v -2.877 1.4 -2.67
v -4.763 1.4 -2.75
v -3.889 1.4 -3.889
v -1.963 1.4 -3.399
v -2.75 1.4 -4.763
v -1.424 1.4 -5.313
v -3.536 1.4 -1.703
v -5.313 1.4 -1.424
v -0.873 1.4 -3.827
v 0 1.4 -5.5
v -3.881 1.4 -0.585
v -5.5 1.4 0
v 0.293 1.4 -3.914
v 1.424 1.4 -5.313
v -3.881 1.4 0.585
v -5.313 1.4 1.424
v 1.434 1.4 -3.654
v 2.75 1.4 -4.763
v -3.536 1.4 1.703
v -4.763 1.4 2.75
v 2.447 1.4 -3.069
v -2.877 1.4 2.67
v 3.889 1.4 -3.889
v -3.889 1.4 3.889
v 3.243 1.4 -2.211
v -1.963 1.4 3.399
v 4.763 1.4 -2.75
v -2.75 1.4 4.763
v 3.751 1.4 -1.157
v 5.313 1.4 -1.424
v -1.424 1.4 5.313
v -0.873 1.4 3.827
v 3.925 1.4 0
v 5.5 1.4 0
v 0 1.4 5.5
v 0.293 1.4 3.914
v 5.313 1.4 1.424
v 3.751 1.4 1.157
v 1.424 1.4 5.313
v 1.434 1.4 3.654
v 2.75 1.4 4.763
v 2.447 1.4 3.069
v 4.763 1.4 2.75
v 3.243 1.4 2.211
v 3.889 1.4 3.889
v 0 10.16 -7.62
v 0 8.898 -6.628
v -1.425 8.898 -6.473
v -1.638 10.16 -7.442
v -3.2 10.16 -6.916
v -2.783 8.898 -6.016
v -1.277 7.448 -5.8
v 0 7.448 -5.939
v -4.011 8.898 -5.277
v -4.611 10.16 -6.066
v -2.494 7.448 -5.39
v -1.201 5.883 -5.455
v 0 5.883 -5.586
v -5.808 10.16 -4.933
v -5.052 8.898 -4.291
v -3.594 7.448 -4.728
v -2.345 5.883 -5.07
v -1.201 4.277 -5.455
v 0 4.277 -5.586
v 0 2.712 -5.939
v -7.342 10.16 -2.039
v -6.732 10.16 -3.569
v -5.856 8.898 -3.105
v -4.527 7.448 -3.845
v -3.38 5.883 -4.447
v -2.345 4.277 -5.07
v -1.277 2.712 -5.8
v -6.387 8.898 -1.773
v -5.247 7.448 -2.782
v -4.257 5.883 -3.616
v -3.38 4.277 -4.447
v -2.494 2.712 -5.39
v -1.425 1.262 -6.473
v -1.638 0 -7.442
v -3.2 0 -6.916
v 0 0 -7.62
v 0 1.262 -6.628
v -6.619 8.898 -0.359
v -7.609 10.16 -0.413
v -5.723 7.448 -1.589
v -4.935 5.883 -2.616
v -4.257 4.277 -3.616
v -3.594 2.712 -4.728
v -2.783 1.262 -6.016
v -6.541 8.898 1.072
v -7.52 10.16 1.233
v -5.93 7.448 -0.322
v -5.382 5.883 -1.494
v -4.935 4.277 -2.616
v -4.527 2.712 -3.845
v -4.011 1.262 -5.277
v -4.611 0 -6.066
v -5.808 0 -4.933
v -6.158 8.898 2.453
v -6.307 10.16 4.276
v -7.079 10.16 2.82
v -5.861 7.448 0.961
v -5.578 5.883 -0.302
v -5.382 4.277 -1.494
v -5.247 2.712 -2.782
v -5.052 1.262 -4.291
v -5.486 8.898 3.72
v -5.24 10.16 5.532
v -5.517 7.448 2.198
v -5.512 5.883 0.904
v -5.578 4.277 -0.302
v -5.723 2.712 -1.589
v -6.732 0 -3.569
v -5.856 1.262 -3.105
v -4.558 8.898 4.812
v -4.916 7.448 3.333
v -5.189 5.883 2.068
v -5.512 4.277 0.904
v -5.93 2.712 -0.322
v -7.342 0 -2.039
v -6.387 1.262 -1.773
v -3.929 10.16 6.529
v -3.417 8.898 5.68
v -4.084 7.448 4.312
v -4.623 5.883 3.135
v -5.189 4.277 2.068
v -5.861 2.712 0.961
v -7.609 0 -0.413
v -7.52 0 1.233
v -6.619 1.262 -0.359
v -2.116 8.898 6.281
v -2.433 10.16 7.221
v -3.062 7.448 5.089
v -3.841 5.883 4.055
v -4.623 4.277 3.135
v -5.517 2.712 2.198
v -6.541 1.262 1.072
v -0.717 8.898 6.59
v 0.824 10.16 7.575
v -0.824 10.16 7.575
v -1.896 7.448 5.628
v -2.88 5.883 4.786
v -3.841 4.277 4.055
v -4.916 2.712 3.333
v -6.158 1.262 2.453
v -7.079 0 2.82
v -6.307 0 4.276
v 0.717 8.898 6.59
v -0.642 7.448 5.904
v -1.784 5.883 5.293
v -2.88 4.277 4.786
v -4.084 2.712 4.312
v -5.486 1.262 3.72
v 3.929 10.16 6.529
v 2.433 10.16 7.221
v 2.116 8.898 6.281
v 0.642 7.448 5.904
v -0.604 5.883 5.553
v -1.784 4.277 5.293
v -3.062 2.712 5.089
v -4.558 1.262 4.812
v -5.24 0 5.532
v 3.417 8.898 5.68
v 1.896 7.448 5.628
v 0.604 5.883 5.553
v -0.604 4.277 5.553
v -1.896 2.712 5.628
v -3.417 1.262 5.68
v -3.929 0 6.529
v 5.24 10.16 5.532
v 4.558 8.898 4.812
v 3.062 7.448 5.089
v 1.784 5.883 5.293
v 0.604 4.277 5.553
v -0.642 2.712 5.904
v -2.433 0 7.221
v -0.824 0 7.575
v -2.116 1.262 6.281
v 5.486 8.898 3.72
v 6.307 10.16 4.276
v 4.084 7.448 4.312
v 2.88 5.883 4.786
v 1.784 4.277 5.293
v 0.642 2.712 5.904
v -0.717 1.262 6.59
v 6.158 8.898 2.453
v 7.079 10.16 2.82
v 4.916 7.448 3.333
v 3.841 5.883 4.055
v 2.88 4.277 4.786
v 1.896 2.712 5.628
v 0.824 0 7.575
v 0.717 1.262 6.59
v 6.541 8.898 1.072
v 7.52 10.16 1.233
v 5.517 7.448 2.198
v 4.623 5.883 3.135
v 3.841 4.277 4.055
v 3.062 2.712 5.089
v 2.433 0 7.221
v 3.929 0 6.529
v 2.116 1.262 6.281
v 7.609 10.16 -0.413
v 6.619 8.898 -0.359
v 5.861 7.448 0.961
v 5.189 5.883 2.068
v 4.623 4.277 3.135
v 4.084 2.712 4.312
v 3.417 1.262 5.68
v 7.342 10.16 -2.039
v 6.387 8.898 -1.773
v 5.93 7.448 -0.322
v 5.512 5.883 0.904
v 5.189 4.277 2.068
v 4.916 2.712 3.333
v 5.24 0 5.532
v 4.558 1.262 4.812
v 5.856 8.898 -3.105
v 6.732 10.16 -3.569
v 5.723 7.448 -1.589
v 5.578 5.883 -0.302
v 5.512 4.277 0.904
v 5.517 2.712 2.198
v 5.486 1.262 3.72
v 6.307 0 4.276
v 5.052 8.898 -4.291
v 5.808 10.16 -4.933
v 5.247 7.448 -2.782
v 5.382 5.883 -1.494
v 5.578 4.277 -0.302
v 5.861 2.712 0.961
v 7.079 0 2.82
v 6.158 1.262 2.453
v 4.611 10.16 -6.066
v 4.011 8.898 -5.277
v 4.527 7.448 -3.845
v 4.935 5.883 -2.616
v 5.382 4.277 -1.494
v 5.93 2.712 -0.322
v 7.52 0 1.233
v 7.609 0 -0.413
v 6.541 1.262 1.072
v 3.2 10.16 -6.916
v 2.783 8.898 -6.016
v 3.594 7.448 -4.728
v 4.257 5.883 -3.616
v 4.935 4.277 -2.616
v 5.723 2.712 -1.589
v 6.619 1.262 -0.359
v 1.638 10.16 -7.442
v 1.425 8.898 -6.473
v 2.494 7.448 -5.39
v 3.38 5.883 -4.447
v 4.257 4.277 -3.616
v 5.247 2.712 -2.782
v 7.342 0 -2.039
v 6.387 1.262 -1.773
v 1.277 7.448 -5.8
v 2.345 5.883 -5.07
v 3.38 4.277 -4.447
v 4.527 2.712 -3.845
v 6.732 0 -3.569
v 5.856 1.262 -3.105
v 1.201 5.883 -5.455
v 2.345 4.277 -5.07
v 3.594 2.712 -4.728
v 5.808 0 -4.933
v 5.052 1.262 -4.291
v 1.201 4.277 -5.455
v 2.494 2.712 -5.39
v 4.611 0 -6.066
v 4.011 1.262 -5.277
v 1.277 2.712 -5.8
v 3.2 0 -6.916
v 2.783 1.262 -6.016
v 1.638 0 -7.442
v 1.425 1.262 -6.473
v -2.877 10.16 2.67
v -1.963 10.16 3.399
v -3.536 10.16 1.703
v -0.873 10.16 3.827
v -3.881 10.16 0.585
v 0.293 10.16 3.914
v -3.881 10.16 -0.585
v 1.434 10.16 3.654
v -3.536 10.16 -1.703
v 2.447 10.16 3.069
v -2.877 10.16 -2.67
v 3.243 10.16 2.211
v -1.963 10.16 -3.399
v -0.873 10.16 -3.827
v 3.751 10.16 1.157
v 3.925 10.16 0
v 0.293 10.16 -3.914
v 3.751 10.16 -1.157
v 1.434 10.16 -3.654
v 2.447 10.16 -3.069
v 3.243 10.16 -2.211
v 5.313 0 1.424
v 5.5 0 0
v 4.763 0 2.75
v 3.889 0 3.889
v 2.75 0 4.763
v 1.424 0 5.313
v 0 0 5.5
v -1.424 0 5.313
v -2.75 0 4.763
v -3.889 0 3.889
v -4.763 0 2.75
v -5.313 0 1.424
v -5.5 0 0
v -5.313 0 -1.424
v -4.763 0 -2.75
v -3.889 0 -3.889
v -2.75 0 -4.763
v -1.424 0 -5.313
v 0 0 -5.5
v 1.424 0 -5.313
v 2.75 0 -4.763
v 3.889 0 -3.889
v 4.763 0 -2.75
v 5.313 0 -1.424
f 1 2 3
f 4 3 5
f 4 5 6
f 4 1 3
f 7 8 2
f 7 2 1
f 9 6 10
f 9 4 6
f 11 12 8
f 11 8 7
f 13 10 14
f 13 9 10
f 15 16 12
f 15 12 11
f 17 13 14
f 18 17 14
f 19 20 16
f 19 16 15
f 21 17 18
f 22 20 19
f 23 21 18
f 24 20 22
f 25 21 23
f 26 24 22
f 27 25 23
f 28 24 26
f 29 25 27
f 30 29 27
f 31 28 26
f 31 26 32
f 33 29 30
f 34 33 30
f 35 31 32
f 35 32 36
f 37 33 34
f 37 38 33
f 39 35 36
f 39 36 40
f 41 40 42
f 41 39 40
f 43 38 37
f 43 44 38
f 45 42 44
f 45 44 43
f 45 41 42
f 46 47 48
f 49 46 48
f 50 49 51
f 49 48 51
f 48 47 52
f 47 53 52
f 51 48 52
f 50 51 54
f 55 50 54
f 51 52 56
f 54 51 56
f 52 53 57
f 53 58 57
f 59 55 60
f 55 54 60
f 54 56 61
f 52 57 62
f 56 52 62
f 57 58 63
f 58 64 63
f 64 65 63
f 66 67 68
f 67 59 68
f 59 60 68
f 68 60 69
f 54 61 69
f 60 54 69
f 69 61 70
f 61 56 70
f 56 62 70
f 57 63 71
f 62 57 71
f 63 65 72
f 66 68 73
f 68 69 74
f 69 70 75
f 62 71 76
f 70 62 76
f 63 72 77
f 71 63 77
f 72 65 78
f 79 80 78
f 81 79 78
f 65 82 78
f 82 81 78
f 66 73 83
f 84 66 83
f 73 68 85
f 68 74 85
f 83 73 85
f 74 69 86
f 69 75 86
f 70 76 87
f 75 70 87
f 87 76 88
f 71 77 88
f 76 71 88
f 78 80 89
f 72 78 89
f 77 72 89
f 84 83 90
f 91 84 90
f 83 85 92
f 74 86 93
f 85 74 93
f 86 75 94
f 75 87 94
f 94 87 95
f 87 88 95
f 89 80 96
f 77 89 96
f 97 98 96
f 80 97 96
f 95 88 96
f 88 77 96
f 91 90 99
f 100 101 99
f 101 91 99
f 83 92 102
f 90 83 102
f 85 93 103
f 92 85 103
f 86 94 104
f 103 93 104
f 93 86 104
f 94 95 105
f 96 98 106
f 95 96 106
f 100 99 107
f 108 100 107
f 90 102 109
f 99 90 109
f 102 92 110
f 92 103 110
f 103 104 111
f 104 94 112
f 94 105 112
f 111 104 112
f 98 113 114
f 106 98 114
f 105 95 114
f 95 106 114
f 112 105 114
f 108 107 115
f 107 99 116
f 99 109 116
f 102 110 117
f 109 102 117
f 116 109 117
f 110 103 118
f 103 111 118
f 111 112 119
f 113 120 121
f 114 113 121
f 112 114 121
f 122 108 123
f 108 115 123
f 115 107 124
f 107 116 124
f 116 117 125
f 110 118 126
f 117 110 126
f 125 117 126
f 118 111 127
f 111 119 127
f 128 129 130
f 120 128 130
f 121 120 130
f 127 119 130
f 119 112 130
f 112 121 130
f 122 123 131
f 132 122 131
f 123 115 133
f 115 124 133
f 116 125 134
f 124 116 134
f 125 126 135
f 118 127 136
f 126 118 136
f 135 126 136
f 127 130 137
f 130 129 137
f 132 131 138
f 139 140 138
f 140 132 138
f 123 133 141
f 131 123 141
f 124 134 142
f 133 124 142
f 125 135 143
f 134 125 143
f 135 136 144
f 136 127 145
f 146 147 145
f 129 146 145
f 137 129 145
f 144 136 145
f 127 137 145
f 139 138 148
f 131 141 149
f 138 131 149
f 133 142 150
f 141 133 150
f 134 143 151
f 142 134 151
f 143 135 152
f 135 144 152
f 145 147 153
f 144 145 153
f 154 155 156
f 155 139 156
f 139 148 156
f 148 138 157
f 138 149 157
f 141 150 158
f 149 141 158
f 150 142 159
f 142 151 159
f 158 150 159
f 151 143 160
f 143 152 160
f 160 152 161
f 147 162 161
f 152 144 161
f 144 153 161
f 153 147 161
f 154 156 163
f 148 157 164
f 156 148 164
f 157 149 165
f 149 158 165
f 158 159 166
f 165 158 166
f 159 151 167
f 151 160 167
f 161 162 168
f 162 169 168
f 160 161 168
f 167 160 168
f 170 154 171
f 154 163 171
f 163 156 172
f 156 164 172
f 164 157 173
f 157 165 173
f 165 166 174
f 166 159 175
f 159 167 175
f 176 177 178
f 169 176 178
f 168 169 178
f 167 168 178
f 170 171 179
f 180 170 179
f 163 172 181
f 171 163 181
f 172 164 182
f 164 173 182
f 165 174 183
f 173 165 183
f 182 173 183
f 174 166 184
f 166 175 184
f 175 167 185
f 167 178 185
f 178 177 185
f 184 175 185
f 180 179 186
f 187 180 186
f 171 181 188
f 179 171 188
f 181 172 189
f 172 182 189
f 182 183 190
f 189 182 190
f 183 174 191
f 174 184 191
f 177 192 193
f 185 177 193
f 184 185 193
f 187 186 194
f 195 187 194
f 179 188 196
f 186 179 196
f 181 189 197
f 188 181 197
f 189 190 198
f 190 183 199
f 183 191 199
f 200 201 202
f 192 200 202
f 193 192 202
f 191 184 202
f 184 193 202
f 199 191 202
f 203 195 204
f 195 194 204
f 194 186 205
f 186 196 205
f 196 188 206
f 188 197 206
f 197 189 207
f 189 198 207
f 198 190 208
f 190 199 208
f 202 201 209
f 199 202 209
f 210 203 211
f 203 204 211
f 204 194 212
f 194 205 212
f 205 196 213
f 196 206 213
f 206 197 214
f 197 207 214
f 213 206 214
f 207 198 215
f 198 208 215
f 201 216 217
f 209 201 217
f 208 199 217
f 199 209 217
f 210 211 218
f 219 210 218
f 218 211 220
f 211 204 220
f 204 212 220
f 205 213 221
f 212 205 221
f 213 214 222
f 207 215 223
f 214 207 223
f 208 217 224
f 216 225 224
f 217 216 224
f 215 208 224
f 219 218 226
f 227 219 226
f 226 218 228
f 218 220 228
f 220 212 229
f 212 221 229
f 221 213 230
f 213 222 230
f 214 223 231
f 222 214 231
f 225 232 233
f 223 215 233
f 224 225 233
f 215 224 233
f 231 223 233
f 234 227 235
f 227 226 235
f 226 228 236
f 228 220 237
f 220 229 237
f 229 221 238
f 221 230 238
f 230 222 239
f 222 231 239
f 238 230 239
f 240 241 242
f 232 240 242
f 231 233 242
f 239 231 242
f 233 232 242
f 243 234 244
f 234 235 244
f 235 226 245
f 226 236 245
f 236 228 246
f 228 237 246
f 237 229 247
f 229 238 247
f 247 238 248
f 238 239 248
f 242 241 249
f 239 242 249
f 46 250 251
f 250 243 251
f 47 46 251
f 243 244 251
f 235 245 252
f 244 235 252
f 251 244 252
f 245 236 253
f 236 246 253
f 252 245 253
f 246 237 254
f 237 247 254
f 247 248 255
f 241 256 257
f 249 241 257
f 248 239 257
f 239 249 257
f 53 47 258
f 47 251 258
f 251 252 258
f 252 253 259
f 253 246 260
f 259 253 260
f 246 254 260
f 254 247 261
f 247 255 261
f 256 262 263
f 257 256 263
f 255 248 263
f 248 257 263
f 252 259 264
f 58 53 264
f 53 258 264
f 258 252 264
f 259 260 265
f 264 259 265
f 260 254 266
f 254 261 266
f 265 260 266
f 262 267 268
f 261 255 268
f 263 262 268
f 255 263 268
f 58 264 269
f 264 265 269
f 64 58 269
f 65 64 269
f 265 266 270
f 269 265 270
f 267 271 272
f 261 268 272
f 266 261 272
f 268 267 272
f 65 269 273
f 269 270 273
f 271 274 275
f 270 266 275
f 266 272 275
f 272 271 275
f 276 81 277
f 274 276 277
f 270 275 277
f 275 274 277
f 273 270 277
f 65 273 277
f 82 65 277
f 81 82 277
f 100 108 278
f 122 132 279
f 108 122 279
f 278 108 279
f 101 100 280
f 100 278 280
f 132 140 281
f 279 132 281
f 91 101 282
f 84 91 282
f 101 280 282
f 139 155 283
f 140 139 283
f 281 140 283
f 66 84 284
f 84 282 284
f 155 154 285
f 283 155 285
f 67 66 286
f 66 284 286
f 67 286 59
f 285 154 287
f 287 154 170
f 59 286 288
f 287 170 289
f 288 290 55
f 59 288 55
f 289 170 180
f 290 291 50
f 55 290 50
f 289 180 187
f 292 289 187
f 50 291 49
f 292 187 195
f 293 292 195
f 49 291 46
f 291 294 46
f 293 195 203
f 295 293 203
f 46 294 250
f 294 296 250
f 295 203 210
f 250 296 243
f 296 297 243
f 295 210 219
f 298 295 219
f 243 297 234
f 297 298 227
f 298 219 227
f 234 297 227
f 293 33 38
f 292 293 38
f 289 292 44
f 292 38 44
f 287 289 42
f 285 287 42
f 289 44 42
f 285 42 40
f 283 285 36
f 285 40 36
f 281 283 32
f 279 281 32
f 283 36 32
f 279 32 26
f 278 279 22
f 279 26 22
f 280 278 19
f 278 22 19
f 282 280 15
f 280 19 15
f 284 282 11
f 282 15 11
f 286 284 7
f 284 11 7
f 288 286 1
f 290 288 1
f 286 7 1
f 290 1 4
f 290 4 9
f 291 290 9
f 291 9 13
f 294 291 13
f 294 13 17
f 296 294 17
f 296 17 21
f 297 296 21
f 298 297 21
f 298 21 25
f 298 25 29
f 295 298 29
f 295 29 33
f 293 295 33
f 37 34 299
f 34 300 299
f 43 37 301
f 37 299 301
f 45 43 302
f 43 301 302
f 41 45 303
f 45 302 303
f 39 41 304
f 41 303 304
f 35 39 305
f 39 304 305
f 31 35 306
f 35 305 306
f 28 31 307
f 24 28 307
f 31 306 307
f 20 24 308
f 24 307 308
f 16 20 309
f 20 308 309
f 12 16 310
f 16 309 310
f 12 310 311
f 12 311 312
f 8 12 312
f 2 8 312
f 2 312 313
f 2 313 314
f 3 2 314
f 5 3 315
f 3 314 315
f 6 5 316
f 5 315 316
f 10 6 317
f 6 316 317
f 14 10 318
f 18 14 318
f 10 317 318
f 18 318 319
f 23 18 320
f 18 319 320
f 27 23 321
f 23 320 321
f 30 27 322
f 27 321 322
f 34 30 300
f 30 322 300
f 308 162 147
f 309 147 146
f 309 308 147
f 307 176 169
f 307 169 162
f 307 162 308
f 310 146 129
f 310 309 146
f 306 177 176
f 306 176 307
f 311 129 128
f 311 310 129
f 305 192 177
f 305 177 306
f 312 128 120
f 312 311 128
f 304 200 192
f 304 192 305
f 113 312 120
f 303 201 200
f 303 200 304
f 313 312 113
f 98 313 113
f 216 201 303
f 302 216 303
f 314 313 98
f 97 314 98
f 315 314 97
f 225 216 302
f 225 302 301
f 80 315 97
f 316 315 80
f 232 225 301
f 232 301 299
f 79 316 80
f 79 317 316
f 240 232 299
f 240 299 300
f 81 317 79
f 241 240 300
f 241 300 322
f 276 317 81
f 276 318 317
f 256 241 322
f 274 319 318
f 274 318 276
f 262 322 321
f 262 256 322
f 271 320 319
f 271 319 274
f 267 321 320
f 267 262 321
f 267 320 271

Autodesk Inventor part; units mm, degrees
ref_plane "YZ Plane" through (0, 0, 0) normal (1, 0, 0) x (0, 1, 0)
ref_plane "XZ Plane" through (0, 0, 0) normal (0, 1, 0) x (-1, 0, 0)
ref_plane "XY Plane" through (0, 0, 0) normal (0, 0, 1) x (1, 0, 0)
sketch "Sketch1" plane through (0, 0, 0) normal (1, 0, 0) x (0, 1, 0)
  line L0 (0, 0) -> (10.16, 0)
  line L1 (10.16, 0) -> (10.16, -7.62)
  line L2 (0, -7.62) -> (0, 0)
  arc A0 (10.16, -7.62) -> (0, -7.62) centre (5.08, -12.7876) ccw
  line L3 (10.16, 0) -> (6.0753, 0)
  line L4 (5.08, 0) -> (5.08, -12.7876) construction
  dimension "d1" = 10.16
  dimension "d2" = 7.62
revolve "Revolution1" add sketch "Sketch1" angle 360 about axis through (0, 10.16, 0) along (0, -1, 0)
sketch "Sketch2" plane through (0, 0, 0) normal (0, -1, 0) x (1, 0, 0)
  circle A0 centre (0, 0) radius 5.5
  dimension "d3" = 11
extrude "Extrusion1" cut sketch "Sketch2" against normal blind 1.4
sketch "Sketch3" plane through (0, 1.4, 0) normal (0, -1, 0) x (1, 0, 0)
  circle A0 centre (0, 0) radius 3.925
  dimension "d6" = 7.85
extrude "Extrusion2" cut sketch "Sketch3" against normal through all
properties part number "top pulley"
